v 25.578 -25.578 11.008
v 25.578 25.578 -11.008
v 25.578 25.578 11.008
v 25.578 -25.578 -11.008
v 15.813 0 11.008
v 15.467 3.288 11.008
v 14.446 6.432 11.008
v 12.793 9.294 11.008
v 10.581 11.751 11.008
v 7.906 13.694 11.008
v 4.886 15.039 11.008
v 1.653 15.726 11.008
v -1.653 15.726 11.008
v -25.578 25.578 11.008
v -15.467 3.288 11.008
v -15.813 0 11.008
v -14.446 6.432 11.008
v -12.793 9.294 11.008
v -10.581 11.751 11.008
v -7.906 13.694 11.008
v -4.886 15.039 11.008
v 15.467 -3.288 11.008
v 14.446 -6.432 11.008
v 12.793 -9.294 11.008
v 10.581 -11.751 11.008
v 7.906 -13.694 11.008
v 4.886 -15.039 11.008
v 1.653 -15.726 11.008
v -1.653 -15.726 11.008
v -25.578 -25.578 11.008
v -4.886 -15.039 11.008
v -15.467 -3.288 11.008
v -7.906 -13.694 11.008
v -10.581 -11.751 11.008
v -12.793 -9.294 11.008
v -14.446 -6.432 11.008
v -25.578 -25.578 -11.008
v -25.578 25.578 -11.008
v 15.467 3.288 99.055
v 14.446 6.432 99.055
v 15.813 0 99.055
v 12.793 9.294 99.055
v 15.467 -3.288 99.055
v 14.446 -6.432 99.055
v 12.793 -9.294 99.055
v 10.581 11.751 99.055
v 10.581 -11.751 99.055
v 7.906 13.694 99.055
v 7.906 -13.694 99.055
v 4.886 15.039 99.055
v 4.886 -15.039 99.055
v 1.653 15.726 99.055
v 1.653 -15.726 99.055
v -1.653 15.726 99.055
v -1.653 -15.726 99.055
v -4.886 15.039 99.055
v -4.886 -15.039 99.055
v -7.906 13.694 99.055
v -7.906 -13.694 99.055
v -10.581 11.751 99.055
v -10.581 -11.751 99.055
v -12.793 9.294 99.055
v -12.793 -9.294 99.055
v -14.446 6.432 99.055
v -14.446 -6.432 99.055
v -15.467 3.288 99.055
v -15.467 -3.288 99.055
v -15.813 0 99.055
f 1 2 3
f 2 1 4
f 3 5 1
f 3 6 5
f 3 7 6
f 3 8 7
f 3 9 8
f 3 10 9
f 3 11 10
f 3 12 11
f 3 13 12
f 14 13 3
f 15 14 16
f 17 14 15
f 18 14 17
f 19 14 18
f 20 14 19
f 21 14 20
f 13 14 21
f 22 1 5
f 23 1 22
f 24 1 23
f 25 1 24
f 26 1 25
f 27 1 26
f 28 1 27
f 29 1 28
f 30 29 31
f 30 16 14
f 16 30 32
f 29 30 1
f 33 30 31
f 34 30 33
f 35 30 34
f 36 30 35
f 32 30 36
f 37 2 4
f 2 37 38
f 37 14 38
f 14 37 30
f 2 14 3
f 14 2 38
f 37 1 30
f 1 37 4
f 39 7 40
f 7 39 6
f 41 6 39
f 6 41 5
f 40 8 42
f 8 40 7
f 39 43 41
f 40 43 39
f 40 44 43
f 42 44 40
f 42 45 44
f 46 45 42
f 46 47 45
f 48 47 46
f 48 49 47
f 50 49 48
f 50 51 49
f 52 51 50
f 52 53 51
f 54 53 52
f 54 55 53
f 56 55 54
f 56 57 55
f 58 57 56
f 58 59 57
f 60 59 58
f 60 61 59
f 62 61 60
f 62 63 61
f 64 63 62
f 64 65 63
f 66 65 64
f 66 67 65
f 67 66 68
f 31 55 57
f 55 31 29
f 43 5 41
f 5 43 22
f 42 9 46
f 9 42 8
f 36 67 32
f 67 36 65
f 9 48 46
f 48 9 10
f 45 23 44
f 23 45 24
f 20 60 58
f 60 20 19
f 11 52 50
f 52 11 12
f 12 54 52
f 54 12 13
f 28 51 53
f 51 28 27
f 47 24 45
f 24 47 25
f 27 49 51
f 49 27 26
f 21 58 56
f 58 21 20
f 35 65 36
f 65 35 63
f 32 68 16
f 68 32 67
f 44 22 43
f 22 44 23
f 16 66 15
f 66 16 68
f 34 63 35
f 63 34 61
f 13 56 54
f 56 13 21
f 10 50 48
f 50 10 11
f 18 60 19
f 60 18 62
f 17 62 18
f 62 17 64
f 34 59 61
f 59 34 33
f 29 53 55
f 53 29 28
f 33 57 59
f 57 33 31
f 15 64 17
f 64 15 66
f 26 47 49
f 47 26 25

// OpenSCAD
seed = 5;
seeds = rands(0,1000000,10,seed);
head_size = rands(50,100,1,seeds[1])[0];
head_length = rands(10,40,1,seeds[2])[0];
bolt_length = rands(head_length*2,200,1,seeds[3])[0];
bolt_radius = rands(head_size/5, head_size/3,1,seeds[0])[0];

union(){
    cube([head_size,head_size,head_length], center=true);
    cylinder(bolt_length,bolt_radius,bolt_radius);
}
